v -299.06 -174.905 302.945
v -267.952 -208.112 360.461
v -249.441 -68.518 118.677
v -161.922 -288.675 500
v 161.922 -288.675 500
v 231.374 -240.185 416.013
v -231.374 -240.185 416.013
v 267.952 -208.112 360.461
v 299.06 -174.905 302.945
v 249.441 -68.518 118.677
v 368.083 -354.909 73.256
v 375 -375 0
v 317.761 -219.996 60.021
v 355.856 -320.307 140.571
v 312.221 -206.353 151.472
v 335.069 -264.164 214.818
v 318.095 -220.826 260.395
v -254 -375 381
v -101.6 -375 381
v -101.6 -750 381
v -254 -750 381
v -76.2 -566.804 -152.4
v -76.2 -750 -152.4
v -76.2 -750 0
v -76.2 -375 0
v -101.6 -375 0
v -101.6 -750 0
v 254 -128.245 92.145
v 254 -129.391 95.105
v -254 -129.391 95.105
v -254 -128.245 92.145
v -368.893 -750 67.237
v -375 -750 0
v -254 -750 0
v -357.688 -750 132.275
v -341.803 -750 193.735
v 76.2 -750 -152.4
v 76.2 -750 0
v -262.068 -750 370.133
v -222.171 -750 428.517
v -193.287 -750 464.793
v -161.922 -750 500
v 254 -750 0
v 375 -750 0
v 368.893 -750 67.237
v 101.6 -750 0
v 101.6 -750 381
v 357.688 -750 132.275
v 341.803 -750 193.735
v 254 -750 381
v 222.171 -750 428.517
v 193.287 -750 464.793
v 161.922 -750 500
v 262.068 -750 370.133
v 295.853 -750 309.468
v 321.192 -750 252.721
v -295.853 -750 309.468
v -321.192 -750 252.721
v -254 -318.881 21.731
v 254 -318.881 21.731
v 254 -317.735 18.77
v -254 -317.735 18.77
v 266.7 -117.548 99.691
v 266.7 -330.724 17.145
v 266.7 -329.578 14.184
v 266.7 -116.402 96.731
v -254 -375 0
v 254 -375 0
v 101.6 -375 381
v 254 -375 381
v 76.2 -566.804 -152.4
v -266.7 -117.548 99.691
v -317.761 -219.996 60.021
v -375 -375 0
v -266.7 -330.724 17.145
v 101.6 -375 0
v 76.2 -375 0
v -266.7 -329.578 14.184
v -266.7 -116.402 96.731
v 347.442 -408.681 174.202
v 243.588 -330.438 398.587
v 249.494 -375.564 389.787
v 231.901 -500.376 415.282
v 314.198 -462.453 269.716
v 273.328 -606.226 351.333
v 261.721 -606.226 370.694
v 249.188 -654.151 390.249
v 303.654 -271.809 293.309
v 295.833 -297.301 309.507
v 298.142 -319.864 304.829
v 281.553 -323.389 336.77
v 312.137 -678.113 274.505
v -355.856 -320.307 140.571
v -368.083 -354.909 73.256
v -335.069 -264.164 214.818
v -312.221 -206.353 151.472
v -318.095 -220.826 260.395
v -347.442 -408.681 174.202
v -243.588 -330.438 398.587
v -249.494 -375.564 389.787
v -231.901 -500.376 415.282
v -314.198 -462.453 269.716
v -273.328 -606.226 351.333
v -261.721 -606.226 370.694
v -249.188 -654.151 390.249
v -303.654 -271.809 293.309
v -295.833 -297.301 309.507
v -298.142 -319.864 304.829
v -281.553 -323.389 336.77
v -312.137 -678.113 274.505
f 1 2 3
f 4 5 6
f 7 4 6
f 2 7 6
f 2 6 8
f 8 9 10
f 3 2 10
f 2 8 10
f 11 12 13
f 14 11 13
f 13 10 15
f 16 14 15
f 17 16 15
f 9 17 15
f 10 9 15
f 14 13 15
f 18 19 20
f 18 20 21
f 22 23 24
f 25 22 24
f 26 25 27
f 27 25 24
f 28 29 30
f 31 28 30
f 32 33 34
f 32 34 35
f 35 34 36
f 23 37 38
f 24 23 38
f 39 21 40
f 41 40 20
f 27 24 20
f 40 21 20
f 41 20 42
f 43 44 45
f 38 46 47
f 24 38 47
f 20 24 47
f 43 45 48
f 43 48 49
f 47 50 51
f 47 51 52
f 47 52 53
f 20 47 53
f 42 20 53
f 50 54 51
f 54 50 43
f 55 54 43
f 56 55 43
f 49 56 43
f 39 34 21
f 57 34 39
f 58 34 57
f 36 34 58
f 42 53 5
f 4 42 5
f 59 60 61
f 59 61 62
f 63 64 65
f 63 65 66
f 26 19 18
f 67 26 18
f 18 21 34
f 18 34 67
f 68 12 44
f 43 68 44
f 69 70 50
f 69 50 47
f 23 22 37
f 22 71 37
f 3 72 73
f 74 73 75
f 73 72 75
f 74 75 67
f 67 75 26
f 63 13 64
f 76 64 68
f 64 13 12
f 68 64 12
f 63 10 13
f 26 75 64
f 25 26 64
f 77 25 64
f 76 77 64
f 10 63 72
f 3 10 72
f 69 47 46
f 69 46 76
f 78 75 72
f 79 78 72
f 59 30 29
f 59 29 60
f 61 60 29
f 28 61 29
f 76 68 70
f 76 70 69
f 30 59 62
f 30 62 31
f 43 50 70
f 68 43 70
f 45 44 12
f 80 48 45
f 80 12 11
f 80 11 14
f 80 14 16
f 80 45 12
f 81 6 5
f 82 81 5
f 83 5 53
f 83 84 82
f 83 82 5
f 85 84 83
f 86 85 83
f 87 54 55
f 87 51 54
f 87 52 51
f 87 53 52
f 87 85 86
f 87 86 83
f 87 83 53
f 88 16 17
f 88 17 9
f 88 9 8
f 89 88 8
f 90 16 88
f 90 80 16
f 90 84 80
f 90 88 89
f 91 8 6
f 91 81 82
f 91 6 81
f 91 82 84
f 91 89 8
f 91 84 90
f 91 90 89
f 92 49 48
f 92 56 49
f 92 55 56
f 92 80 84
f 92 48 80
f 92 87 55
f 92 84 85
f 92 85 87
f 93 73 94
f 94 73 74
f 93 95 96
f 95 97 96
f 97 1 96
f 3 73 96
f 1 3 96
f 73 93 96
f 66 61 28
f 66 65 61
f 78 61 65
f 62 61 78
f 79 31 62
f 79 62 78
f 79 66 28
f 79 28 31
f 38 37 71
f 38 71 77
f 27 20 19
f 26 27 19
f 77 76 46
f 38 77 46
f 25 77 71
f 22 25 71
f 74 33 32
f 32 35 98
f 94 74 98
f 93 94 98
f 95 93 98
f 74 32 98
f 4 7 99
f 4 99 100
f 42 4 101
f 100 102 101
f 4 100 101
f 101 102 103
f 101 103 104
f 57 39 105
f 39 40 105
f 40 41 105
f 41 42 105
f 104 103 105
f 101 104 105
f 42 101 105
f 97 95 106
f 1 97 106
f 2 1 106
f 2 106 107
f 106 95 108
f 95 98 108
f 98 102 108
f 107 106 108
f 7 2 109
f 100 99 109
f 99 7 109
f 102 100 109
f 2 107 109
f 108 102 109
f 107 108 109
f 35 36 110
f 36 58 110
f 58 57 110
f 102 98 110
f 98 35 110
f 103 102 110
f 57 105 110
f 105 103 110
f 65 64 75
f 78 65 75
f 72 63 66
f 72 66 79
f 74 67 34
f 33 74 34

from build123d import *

# Parameters (mm, degrees)
BOSS_EXTRUDE1_DEPTH = 500
CUT_EXTRUDE1_DEPTH  = 1000
CUT_EXTRUDE2_DEPTH  = 1000
SKETCH5_W           = 533.4
SKETCH5_H           = 228.6
SKETCH5_W_2         = 508
SKETCH5_H_2         = 203.2
BOSS_EXTRUDE2_DEPTH = 3.175
SKETCH6_W           = 152.4
SKETCH6_H           = 375
CUT_EXTRUDE4_DEPTH  = 381
BOSS_EXTRUDE4_DEPTH = 76.2


with BuildPart() as part:
    # Sketch2 → Boss-Extrude1 (new, symmetric)
    with BuildSketch(Plane(origin=(0, 0, 0), x_dir=(0, 0, -1), z_dir=(1, 0, 0))):
        Polygon((0, -750), (-500, -750), (-500, -288.675134595), (-118.676951522, -68.518169908), (0, -375), align=None)
    extrude(amount=BOSS_EXTRUDE1_DEPTH, both=True)

    # Sketch3 → Cut-Extrude1 (cut)
    with BuildSketch(Plane.XZ.offset(750)):
        with BuildLine():
            Line((-161.921680379, 500), (-500, 500))
            Line((-500, 500), (-500, 0))
            Line((-500, 0), (-375, 0))
            add(Edge.make_bspline(
                [(-375, 0), (-359.934223317, 289.431587022), (-161.921680379, 500)],
                knots=[0, 0, 0, 1, 1, 1], degree=2))
        make_face()
        with BuildLine():
            Line((500, 0), (500, 500))
            Line((500, 500), (161.921680379, 500))
            add(Edge.make_bspline(
                [(375, 0), (359.934223317, 289.431587022), (161.921680379, 500)],
                knots=[0, 0, 0, 1, 1, 1], degree=2))
            Line((375, 0), (500, 0))
        make_face()
    extrude(amount=-CUT_EXTRUDE1_DEPTH, mode=Mode.SUBTRACT)

    # Sketch4 → Cut-Extrude2 (cut)
    with BuildSketch(Plane(origin=(0, 0, 0), x_dir=(-1, 0, 0), z_dir=(0, 0, -1))):
        with BuildLine():
            Line((-375, -375), (-996.294304176, -375))
            Line((-996.294304176, -375), (-996.294304176, 371.909901341))
            Line((-996.294304176, 371.909901341), (846.489564783, 371.909901341))
            Line((846.489564783, 371.909901341), (846.489564783, -375))
            Line((846.489564783, -375), (375, -375))
            add(Edge.make_bspline(
                [(-375, -375), (0, 724.407090278), (375, -375)],
                knots=[0, 0, 0, 1, 1, 1], degree=2))
        make_face()
    extrude(amount=-CUT_EXTRUDE2_DEPTH, mode=Mode.SUBTRACT)

    # Sketch5 → Boss-Extrude2 (add)
    with BuildSketch(Plane(origin=(0, -48.896596526, 126.274884856), x_dir=(-1, 0, 0), z_dir=(0, 0.36109683475385423, -0.9325283244656689))):
        with Locations((0, -187.918797542)):
            Rectangle(SKETCH5_W, SKETCH5_H)
        with Locations((0, -187.918797542)):
            Rectangle(SKETCH5_W_2, SKETCH5_H_2, mode=Mode.SUBTRACT)
    extrude(amount=BOSS_EXTRUDE2_DEPTH)

    # Sketch6 → Cut-Extrude4 (cut)
    with BuildSketch(Plane(origin=(0, 0, 0), x_dir=(-1, 0, 0), z_dir=(0, 0, -1))):
        with Locations((-177.8, -562.5)):
            Rectangle(SKETCH6_W, SKETCH6_H)
        with Locations((177.8, -562.5)):
            Rectangle(SKETCH6_W, SKETCH6_H)
    extrude(amount=-CUT_EXTRUDE4_DEPTH, mode=Mode.SUBTRACT)

    # Sketch7 → Boss-Extrude4 (add, symmetric)
    with BuildSketch(Plane(origin=(0, 0, 0), x_dir=(0, 0, -1), z_dir=(1, 0, 0))):
        Polygon((0, -375), (152.4, -566.804213416), (152.4, -750), (0, -750), align=None)
    extrude(amount=BOSS_EXTRUDE4_DEPTH, both=True)


solid = part.part
